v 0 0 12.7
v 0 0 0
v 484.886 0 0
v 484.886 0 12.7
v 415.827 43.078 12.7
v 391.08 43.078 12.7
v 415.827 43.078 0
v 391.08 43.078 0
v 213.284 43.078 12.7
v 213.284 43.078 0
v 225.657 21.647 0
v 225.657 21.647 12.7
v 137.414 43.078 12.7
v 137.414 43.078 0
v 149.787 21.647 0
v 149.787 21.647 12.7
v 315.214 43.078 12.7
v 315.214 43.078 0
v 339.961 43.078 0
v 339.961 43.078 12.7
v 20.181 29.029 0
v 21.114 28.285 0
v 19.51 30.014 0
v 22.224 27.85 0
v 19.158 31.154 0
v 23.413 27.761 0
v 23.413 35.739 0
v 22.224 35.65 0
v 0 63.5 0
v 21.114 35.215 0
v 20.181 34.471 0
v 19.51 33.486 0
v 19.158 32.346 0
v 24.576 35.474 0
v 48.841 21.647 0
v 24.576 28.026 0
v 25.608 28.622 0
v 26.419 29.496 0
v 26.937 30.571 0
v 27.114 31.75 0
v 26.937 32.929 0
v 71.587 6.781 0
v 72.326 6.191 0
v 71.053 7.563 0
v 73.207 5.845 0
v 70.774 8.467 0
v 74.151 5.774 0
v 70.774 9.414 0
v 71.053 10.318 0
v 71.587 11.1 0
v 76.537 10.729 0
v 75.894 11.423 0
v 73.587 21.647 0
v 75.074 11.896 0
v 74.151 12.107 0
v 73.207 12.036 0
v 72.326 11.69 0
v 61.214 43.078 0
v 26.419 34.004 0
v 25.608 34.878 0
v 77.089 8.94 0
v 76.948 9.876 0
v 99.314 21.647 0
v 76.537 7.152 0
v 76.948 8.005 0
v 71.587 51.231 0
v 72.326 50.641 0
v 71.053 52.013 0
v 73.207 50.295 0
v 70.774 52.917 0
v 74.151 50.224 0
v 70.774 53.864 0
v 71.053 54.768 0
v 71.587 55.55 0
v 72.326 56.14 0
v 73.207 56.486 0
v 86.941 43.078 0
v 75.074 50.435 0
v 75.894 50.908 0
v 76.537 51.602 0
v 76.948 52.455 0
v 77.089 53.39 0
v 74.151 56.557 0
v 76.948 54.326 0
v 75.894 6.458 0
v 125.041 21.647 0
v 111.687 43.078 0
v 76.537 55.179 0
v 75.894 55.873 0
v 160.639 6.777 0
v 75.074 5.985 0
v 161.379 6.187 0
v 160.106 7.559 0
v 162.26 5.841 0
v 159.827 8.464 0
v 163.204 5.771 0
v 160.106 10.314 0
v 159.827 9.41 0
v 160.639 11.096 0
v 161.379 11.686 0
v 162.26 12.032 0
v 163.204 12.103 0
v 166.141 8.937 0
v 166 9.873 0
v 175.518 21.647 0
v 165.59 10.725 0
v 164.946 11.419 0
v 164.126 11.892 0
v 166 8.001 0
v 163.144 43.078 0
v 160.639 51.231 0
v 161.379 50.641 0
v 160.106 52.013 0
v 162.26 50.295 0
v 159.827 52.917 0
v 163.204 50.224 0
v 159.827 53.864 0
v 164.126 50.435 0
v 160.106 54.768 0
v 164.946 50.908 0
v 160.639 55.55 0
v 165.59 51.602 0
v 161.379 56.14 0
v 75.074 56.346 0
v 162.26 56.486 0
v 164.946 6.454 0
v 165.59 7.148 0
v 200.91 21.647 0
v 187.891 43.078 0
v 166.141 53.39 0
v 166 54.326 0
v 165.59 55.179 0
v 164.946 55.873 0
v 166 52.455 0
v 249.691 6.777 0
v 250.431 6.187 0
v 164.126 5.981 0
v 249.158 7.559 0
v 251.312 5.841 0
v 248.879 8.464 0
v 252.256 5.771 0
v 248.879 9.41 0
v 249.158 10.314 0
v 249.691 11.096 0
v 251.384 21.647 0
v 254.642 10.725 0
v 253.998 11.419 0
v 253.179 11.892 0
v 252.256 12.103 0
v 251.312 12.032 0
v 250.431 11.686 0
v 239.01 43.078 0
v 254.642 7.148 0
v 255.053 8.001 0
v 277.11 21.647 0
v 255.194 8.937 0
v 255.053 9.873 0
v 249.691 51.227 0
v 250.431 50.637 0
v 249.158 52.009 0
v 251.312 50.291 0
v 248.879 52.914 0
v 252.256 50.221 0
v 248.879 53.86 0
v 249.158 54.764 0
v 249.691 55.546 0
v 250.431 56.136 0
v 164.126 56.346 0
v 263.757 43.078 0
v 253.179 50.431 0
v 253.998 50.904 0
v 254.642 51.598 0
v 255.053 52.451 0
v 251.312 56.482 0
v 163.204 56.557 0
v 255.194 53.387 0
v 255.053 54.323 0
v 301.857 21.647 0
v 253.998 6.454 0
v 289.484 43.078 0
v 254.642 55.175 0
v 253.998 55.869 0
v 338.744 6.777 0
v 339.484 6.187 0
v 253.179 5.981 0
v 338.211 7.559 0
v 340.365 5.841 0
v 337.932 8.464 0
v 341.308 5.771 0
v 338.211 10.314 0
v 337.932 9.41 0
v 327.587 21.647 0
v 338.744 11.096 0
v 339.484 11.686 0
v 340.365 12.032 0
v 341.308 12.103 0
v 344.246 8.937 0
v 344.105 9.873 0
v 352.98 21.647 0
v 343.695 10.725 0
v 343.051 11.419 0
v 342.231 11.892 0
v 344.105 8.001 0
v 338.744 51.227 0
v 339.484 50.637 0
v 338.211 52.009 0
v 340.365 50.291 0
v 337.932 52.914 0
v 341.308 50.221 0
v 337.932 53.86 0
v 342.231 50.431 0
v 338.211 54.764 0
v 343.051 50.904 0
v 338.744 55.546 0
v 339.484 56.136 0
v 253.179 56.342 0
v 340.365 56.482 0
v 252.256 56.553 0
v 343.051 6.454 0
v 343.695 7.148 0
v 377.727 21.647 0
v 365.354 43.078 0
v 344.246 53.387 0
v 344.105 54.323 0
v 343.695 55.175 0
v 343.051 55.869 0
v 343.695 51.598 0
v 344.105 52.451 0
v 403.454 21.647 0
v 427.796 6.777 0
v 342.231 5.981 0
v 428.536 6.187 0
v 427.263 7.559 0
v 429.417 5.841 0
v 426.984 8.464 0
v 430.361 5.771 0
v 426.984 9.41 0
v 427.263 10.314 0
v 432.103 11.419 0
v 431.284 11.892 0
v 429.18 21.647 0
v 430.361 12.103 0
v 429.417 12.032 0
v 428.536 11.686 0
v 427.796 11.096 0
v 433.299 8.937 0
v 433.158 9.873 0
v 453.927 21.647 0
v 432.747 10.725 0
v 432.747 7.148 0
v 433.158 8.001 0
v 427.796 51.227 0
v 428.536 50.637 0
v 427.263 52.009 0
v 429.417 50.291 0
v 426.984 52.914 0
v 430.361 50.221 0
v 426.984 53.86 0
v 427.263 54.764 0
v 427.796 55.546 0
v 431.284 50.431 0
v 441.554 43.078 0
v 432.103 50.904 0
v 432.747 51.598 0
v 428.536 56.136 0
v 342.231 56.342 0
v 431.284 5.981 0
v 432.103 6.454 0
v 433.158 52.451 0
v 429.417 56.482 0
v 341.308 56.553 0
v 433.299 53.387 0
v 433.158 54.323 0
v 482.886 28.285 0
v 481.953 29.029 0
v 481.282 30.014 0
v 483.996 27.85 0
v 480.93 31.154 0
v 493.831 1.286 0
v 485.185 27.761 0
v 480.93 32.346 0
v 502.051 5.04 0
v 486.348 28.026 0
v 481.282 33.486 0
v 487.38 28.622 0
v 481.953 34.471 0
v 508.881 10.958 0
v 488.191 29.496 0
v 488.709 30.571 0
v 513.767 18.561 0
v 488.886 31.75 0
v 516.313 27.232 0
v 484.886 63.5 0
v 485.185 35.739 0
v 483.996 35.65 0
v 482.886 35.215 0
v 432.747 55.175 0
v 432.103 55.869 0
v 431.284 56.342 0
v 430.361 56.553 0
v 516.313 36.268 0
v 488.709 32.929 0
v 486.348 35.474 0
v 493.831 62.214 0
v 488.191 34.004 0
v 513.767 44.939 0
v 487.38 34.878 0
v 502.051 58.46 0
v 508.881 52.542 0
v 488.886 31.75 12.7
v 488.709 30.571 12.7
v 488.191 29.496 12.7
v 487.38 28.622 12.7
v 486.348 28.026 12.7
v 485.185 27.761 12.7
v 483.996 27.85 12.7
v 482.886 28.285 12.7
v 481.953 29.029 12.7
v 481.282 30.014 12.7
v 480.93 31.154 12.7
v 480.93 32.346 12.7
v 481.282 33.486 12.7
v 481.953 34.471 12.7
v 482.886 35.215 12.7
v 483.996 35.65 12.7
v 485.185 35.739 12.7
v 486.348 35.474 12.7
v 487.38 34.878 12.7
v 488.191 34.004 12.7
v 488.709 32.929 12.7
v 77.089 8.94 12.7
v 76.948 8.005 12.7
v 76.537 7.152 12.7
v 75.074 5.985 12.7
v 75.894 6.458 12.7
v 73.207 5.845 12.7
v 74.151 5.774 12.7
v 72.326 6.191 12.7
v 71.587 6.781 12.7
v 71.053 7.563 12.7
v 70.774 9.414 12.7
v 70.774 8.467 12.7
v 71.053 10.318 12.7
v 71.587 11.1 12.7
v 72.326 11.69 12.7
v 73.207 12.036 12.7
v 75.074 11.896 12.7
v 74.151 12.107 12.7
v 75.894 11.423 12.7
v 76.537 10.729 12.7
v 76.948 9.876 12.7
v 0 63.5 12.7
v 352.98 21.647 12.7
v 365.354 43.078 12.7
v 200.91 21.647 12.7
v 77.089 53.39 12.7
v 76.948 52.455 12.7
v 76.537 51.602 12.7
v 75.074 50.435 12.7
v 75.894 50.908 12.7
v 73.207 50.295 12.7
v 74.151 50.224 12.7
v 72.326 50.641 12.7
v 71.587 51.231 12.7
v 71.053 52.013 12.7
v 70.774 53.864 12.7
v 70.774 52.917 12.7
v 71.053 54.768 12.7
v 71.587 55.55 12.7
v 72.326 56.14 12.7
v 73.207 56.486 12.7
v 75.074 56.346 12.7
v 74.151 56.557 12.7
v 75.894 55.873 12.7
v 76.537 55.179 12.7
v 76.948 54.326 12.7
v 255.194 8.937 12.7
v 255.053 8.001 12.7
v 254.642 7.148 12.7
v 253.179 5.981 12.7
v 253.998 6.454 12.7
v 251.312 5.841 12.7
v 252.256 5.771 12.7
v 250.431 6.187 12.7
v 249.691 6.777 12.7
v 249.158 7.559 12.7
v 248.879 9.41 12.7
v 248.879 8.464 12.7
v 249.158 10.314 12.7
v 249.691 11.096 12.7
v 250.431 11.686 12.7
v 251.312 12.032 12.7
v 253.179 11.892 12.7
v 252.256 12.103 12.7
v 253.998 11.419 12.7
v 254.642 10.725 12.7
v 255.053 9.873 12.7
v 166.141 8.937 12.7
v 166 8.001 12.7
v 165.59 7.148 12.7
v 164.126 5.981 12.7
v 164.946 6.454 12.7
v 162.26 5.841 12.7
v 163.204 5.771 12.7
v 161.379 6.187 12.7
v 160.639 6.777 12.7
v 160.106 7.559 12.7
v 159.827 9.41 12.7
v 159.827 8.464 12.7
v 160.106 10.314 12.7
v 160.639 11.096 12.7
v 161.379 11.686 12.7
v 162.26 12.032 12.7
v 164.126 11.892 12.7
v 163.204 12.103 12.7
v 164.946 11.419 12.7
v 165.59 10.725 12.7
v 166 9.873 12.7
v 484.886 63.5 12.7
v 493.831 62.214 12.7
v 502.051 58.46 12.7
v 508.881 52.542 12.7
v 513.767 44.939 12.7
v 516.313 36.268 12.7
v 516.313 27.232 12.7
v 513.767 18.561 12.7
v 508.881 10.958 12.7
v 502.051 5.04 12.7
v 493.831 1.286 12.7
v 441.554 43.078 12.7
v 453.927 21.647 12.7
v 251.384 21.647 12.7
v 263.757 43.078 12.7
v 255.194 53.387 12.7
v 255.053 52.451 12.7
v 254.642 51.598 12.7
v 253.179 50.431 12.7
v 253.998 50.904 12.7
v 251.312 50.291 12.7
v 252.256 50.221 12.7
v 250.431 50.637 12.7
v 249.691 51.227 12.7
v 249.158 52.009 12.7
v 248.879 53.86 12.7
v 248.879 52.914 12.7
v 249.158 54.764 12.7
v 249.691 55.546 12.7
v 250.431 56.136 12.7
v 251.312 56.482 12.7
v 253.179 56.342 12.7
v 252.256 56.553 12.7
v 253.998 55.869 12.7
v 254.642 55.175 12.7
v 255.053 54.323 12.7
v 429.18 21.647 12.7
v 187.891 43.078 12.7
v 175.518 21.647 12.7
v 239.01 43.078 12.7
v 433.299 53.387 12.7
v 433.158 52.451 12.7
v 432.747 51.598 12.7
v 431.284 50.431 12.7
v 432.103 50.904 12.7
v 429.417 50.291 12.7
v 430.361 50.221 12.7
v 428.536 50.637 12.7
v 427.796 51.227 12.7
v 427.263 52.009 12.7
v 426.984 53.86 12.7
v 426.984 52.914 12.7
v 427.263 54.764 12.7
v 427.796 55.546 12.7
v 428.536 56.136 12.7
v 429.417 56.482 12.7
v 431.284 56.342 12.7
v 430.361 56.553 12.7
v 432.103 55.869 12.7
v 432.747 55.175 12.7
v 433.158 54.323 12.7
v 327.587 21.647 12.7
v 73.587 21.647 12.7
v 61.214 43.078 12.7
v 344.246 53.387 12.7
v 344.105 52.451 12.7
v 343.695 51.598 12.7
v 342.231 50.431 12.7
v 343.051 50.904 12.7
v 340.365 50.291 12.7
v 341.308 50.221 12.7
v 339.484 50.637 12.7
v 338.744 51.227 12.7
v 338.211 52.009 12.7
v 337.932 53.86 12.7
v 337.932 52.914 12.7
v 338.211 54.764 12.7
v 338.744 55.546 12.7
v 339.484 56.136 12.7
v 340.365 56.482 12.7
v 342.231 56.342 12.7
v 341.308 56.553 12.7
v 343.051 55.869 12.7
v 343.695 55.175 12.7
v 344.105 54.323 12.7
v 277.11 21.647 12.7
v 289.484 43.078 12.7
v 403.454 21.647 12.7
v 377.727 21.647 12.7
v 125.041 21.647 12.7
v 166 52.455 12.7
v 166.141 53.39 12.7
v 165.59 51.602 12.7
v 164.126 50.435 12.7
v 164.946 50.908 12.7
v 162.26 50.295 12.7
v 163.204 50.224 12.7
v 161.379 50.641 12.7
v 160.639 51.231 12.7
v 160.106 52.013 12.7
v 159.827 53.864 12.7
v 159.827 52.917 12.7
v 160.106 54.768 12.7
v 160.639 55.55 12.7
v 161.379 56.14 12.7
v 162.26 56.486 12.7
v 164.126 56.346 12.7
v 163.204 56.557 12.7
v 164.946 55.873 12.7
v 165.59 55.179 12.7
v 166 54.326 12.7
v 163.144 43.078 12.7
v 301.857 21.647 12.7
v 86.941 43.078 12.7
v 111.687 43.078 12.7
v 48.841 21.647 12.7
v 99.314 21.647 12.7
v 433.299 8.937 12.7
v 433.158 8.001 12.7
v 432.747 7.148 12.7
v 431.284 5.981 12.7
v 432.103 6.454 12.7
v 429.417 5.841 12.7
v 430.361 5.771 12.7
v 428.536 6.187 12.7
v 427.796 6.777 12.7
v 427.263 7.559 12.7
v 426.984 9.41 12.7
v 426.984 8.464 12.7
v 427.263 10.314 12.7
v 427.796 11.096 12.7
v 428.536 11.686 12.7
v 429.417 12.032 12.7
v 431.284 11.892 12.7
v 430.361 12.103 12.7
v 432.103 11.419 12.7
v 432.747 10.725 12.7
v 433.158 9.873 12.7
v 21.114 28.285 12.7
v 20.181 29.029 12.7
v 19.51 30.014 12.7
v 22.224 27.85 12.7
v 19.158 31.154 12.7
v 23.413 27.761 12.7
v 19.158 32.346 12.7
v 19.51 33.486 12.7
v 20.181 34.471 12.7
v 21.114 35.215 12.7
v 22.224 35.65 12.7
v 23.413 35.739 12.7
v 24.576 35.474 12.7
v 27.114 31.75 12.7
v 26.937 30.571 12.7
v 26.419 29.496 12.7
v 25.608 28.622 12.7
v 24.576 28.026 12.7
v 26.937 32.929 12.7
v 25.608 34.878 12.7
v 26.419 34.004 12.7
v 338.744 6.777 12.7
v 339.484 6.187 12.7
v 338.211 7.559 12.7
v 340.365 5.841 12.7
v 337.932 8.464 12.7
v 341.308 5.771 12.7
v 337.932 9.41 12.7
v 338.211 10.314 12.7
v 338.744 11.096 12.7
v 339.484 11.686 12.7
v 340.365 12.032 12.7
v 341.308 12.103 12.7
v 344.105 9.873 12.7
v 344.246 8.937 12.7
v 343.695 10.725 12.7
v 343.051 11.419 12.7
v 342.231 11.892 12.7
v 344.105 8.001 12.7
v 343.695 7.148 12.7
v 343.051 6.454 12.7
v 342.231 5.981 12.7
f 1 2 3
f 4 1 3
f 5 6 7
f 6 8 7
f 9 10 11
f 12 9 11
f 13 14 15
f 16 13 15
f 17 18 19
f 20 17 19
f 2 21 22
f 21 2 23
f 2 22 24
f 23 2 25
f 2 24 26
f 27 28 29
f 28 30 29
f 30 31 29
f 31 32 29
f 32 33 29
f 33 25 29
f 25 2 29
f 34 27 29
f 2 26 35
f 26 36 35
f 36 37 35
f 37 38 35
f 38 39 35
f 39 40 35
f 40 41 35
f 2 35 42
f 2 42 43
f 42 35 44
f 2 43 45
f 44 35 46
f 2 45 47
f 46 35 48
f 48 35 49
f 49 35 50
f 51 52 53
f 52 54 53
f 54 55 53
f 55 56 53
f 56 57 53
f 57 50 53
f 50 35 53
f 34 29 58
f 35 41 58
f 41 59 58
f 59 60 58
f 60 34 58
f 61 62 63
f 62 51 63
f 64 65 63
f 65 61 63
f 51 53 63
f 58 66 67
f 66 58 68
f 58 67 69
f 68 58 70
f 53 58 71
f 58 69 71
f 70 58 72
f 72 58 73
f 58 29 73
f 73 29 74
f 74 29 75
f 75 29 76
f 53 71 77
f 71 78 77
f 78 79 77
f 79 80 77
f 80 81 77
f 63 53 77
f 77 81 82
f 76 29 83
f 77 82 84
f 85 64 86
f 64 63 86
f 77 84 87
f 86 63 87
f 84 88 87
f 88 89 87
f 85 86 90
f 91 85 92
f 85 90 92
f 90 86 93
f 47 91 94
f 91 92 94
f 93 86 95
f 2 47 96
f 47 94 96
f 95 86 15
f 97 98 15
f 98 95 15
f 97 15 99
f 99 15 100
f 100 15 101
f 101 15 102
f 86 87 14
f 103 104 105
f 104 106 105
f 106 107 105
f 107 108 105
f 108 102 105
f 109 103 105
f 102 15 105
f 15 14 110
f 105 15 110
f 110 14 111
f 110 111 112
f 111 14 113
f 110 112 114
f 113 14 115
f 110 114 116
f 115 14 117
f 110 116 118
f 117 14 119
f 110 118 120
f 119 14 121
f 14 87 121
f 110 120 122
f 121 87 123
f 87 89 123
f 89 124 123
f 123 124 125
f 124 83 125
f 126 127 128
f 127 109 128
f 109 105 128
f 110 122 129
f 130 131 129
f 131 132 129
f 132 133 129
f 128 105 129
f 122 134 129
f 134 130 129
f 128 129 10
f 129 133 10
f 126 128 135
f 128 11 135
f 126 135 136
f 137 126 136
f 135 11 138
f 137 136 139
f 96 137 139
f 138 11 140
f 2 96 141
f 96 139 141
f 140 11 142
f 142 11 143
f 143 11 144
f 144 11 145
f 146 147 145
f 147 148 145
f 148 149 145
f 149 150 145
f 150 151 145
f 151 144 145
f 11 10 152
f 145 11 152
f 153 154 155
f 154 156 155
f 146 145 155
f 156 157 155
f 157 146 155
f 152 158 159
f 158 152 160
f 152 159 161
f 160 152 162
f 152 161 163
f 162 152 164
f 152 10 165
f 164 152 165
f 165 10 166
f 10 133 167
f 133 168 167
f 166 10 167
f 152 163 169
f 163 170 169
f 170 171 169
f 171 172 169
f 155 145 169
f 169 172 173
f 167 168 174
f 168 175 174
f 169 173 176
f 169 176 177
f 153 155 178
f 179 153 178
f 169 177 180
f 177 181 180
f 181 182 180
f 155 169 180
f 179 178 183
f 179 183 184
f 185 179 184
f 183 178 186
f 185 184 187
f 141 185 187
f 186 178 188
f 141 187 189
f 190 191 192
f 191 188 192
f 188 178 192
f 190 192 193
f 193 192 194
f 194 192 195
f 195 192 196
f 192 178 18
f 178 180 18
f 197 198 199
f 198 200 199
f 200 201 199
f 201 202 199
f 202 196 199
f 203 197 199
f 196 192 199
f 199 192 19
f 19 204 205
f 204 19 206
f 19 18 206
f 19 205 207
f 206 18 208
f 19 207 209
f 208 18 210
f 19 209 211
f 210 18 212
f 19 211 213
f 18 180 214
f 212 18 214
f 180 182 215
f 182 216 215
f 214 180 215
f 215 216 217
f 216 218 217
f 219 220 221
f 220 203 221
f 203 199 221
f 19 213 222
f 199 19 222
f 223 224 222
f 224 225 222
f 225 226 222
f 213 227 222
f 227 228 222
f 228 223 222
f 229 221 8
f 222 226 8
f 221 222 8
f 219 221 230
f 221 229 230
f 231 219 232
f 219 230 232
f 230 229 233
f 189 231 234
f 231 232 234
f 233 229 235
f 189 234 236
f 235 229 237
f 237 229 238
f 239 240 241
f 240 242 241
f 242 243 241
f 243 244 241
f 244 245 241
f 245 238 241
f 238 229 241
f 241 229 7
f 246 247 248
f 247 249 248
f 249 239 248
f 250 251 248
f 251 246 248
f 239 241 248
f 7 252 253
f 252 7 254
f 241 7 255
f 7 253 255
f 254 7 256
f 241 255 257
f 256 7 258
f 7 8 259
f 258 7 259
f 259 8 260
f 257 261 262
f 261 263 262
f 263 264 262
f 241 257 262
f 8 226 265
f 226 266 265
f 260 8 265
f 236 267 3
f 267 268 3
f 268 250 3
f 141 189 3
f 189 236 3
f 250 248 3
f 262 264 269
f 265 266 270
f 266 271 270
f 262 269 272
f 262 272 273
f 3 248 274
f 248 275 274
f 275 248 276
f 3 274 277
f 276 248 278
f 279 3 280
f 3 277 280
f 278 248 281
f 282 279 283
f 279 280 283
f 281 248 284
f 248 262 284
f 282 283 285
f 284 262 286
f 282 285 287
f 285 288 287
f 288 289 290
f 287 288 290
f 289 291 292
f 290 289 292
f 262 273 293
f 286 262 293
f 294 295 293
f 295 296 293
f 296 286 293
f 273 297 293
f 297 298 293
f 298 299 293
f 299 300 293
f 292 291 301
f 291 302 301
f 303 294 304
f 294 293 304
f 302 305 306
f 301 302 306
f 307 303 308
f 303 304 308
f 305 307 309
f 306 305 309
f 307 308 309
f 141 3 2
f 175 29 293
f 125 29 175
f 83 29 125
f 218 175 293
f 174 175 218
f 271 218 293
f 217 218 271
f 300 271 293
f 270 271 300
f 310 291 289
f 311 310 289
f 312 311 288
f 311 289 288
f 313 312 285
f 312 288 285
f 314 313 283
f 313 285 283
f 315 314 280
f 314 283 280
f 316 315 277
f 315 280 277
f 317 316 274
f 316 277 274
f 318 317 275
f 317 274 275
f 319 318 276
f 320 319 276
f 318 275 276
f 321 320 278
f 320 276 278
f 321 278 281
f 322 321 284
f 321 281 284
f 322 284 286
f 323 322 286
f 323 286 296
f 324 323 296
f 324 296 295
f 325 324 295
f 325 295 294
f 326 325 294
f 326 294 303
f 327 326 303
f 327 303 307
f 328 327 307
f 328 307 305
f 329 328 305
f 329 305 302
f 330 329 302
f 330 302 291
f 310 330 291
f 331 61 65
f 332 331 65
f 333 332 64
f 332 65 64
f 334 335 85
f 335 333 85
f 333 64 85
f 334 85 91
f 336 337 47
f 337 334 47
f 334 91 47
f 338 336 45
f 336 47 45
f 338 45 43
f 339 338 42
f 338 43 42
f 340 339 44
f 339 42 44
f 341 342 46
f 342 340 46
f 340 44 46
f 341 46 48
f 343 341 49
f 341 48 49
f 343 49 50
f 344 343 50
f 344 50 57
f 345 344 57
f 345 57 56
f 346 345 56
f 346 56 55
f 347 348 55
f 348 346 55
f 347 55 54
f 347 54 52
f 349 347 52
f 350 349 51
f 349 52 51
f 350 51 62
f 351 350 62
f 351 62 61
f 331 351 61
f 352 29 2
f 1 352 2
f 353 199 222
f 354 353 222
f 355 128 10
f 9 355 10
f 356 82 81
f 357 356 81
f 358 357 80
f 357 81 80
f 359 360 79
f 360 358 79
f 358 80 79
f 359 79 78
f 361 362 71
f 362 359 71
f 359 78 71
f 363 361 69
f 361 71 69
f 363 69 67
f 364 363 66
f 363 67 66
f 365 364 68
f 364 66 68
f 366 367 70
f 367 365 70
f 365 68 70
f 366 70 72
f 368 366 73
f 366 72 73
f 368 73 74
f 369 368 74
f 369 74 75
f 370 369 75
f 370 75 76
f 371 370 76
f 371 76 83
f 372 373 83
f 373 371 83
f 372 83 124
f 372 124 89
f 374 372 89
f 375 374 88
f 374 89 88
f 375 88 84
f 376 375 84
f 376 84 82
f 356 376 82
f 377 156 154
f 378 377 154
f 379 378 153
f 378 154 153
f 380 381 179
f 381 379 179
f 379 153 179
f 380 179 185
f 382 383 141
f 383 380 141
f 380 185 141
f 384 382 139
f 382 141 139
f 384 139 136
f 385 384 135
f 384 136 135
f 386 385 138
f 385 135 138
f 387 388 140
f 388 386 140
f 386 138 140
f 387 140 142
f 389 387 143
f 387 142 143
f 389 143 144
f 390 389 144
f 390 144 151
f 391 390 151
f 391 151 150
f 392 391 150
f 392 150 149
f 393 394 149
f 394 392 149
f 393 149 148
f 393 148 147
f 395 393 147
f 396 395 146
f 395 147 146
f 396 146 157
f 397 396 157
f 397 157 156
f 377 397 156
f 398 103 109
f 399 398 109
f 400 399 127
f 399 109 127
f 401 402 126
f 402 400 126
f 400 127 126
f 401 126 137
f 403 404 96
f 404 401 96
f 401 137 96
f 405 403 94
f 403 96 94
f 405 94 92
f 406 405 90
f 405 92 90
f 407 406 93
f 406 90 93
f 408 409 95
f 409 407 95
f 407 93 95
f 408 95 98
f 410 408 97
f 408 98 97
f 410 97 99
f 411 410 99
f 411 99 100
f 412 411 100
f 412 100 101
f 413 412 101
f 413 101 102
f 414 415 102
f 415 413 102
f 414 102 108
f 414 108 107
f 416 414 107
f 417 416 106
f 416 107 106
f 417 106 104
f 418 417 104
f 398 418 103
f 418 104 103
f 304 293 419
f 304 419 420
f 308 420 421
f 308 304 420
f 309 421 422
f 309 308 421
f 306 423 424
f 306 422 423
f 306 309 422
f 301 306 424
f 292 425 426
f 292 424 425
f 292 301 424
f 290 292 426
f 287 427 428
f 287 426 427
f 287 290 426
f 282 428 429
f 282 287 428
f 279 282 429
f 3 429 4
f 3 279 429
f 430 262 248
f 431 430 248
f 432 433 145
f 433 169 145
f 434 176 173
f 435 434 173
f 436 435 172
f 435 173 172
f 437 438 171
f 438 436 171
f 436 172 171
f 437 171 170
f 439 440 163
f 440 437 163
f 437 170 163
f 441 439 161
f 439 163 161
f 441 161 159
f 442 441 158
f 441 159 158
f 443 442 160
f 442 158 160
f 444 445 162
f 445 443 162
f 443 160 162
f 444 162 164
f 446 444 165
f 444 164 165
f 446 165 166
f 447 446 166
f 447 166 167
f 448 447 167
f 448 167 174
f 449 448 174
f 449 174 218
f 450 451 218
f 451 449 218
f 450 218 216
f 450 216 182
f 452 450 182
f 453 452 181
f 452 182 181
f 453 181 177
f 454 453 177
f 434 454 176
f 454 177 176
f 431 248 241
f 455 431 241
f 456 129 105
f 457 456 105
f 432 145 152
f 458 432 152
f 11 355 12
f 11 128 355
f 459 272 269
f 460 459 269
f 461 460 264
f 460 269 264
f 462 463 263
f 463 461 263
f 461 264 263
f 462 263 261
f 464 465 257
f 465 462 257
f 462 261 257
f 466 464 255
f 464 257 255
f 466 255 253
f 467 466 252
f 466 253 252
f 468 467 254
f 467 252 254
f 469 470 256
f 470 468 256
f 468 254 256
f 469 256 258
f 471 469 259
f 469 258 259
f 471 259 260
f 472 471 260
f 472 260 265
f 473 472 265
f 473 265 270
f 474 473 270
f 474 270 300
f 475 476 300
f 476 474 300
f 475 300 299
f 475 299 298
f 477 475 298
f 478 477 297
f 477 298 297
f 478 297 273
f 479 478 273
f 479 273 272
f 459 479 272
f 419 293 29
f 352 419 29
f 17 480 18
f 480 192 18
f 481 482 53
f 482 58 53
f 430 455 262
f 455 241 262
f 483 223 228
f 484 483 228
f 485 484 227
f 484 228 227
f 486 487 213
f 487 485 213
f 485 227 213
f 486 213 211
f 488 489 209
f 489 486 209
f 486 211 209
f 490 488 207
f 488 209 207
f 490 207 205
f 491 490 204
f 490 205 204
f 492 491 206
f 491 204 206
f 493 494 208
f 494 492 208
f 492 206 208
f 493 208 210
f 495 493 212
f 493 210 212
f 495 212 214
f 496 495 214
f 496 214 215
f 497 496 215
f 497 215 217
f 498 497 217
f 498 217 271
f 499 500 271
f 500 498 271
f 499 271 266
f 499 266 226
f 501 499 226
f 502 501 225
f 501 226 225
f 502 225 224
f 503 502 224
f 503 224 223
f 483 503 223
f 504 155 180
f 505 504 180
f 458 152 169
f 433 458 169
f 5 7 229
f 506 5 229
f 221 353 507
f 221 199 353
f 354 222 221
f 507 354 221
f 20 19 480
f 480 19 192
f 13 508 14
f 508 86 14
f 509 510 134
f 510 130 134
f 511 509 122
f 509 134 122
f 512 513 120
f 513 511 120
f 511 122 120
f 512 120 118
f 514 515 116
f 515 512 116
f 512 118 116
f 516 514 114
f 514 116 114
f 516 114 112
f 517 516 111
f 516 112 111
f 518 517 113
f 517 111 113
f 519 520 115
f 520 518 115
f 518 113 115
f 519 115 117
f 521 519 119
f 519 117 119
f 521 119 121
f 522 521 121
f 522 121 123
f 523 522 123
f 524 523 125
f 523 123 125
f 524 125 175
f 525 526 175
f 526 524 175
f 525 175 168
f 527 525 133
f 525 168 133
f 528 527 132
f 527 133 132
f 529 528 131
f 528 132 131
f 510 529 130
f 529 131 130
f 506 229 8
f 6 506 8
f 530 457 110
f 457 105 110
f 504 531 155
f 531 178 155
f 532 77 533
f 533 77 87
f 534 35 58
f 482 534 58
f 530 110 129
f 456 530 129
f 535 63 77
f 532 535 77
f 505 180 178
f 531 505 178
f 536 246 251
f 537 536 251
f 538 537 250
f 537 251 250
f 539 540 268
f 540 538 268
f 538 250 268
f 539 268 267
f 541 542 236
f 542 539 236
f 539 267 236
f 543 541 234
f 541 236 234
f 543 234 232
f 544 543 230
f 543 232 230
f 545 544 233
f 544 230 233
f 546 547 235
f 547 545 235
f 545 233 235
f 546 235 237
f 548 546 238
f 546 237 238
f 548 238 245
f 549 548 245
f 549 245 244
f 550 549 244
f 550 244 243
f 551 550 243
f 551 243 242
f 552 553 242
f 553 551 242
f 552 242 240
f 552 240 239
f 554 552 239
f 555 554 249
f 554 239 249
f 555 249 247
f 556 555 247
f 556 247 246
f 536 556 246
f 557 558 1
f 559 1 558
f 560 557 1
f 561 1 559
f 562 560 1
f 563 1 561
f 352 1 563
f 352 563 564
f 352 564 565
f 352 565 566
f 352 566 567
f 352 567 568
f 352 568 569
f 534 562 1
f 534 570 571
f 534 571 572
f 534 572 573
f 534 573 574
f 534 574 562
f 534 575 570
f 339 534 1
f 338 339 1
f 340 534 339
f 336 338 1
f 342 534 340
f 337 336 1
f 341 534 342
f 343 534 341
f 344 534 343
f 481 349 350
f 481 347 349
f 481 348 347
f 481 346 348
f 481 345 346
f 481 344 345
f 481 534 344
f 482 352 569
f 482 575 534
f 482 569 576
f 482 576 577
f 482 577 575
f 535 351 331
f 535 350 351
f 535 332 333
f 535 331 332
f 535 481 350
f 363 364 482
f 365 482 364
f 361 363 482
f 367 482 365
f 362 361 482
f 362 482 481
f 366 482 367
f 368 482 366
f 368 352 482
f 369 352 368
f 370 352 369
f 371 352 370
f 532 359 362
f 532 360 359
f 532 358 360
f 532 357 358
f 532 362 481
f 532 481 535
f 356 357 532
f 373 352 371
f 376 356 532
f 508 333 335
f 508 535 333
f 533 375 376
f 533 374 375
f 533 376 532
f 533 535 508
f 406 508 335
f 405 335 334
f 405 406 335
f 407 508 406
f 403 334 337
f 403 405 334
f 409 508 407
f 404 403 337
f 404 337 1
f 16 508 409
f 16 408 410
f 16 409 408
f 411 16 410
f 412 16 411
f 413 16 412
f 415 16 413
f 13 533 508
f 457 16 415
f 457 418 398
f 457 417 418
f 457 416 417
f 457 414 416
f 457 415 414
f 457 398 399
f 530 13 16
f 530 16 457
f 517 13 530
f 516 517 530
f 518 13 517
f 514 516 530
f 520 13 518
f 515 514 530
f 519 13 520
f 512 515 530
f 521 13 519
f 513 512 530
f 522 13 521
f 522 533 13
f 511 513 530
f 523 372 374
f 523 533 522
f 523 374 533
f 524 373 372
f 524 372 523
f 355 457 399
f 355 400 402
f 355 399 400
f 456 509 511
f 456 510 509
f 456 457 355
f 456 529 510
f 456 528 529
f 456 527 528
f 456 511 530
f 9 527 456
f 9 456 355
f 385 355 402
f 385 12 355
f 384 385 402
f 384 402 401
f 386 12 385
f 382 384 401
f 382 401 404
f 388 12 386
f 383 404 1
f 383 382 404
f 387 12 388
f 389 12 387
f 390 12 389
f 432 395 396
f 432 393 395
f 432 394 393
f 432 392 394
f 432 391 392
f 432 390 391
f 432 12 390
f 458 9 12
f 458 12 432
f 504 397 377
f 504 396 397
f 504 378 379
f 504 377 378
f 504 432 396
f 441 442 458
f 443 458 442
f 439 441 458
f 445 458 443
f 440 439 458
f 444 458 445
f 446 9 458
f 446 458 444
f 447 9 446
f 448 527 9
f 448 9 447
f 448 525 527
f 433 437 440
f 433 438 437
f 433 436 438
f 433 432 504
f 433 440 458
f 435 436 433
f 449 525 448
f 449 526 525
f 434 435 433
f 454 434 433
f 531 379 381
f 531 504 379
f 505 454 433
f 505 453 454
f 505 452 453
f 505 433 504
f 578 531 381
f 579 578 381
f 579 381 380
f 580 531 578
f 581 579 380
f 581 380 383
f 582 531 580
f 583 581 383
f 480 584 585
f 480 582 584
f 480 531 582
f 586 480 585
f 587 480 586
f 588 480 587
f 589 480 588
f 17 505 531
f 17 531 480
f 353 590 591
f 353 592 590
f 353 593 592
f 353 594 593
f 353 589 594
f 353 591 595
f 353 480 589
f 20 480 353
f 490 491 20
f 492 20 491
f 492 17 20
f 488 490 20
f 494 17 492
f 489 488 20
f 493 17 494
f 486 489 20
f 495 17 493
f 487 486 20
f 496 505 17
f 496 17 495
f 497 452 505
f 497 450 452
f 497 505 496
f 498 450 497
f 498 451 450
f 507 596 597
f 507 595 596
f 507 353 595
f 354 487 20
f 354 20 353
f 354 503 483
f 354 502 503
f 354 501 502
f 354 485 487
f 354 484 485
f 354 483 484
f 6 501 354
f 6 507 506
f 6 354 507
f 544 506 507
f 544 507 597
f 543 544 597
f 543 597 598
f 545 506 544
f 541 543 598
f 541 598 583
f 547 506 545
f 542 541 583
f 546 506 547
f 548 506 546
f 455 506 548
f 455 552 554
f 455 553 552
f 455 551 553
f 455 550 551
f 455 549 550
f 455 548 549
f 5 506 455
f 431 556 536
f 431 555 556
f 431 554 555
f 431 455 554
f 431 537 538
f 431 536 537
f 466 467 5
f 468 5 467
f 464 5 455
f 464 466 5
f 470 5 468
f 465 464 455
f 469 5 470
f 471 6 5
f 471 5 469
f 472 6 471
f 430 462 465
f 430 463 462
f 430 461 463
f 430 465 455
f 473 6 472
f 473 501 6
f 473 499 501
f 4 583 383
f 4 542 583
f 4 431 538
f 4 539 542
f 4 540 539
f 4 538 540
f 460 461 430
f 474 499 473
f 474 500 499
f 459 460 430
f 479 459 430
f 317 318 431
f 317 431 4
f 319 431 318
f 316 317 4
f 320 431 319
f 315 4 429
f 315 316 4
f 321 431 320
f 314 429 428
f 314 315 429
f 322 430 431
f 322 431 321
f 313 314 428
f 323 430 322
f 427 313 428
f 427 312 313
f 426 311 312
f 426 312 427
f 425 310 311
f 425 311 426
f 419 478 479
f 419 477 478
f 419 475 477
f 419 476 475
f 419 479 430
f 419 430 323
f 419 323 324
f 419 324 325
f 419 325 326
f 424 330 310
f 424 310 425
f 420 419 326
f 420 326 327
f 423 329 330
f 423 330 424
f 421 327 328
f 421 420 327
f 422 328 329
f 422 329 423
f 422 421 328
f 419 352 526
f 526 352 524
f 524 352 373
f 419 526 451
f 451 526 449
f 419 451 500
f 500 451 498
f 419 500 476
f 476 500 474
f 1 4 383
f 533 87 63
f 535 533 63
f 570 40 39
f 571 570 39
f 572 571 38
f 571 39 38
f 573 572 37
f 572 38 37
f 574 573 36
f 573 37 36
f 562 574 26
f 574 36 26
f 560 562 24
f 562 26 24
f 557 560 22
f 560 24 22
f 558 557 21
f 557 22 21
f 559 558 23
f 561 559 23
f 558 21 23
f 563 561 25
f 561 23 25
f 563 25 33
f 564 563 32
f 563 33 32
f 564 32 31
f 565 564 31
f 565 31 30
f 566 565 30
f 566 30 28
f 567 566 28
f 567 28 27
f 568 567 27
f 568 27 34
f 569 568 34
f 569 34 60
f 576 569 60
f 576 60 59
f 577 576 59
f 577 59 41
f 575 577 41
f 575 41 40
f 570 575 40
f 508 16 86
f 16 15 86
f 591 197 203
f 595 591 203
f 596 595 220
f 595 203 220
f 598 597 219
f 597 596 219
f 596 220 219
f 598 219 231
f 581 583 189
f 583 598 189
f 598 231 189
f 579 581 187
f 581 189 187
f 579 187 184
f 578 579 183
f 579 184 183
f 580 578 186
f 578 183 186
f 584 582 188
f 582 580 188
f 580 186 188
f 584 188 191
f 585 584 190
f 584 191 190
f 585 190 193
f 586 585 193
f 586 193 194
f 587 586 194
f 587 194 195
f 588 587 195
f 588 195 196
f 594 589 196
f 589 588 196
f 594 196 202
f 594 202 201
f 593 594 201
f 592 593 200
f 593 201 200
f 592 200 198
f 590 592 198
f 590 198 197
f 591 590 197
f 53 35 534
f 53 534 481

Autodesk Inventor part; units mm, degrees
ref_plane "YZ Plane" through (0, 0, 0) normal (1, 0, 0) x (0, 1, 0)
ref_plane "XZ Plane" through (0, 0, 0) normal (0, 1, 0) x (-1, 0, 0)
ref_plane "XY Plane" through (0, 0, 0) normal (0, 0, 1) x (1, 0, 0)
sketch "Sketch1" plane through (0, 0, 0) normal (0, 0, 1) x (1, 0, 0)
  line L0 (0, 0) -> (484.886, 0)
  line L1 (484.886, 63.5) -> (0, 63.5)
  line L2 (0, 63.5) -> (0, 0)
  circle A0 centre (73.914, 53.3905) radius 3.175
  circle A1 centre (162.9664, 53.3905) radius 3.175
  circle A2 centre (252.0188, 53.3868) radius 3.175
  circle A3 centre (341.0712, 53.3868) radius 3.175
  circle A4 centre (430.1236, 53.3868) radius 3.175
  circle A5 centre (73.914, 8.9405) radius 3.175
  circle A6 centre (162.9664, 8.9368) radius 3.175
  circle A7 centre (252.0188, 8.9368) radius 3.175
  circle A8 centre (341.0712, 8.9368) radius 3.175
  circle A9 centre (430.1236, 8.9368) radius 3.175
  line L3 (61.214, 43.0781) -> (73.5873, 21.6469)
  line L4 (48.8407, 21.6469) -> (61.214, 43.0781)
  line L5 (137.414, 43.0781) -> (149.7873, 21.6469)
  line L6 (149.7873, 21.6469) -> (125.0407, 21.6469)
  line L7 (125.0407, 21.6469) -> (137.414, 43.0781)
  line L8 (99.314, 21.6469) -> (86.9407, 43.0781)
  line L9 (86.9407, 43.0781) -> (111.6873, 43.0781)
  line L10 (111.6873, 43.0781) -> (99.314, 21.6469)
  line L11 (48.8407, 21.6469) -> (73.5873, 21.6469)
  line L12 (289.4838, 43.0781) -> (301.8571, 21.6469)
  line L13 (301.8571, 21.6469) -> (277.1105, 21.6469)
  line L14 (277.1105, 21.6469) -> (289.4838, 43.0781)
  line L15 (263.7571, 43.0781) -> (251.3838, 21.6469)
  line L16 (251.3838, 21.6469) -> (239.0105, 43.0781)
  line L17 (239.0105, 43.0781) -> (263.7571, 43.0781)
  line L18 (213.2838, 43.0781) -> (225.6571, 21.6469)
  line L19 (200.9105, 21.6469) -> (225.6571, 21.6469)
  line L20 (200.9105, 21.6469) -> (213.2838, 43.0781)
  line L21 (441.5536, 43.0781) -> (453.9269, 21.6469)
  line L22 (453.9269, 21.6469) -> (429.1803, 21.6469)
  line L23 (429.1803, 21.6469) -> (441.5536, 43.0781)
  line L24 (415.8269, 43.0781) -> (403.4536, 21.6469)
  line L25 (403.4536, 21.6469) -> (391.0803, 43.0781)
  line L26 (391.0803, 43.0781) -> (415.8269, 43.0781)
  line L27 (365.3536, 43.0781) -> (377.7269, 21.6469)
  line L28 (352.9803, 21.6469) -> (377.7269, 21.6469)
  line L29 (352.9803, 21.6469) -> (365.3536, 43.0781)
  line L30 (175.5175, 21.6469) -> (163.1442, 43.0781)
  line L31 (163.1442, 43.0781) -> (187.8909, 43.0781)
  line L32 (187.8909, 43.0781) -> (175.5175, 21.6469)
  line L33 (339.9607, 43.0781) -> (327.5873, 21.6469)
  line L34 (327.5873, 21.6469) -> (315.214, 43.0781)
  line L35 (315.214, 43.0781) -> (339.9607, 43.0781)
  line L36 (15.7817, 31.75) -> (30.4463, 31.75)
  circle A10 centre (23.114, 31.75) radius 4.0005
  circle A11 centre (484.886, 31.75) radius 4.0005
  arc A12 (484.886, 0) -> (484.886, 63.5) centre (484.886, 31.75) ccw
  point P0 (135.1884, 47.8306)
  point P1 (135.1884, 33.5431)
  point P2 (23.114, 19.05)
  point P3 (23.114, 25.4)
  point P4 (287.2582, 33.5431)
  point P5 (439.328, 33.5431)
  dimension "d18" = 44.45
  dimension "d36" = 56.5658
  dimension "d69" = 126.3396
  dimension "d72" = 25.4
  dimension "d12" = 6.35
  dimension "d15" = 89.0524
  dimension "d44" = 6.35
  dimension "d66" = 100.9467
  dimension "d97" = 152.0698
  dimension "d102" = 51.1231
  dimension "d115" = 8.001
extrude "Extrusion1" add sketch "Sketch1" along normal blind 12.7 contours L2 L1 A12 L0 | L3 L11 L4 | L12 L13 L14 | L15 L16 L17 | L18 L19 L20 | L21 L22 L23 | L24 L25 L26 | L27 L28 L29 | L30 L31 L32 | L33 L34 L35 | A10 L36 | L36 A10 | A11
extrude "Extrusion4" cut sketch "Sketch1" along normal blind 12.7 contours L3 L11 L4
extrude "Extrusion5" cut sketch "Sketch1" along normal blind 12.7 contours L12 L13 L14 | L15 L16 L17 | L18 L19 L20 | L21 L22 L23 | L24 L25 L26 | L27 L28 L29 | L30 L31 L32 | L33 L34 L35
extrude "Extrusion6" cut sketch "Sketch1" along normal blind 25.4 contours A11
extrude "Extrusion7" cut sketch "Sketch1" along normal blind 25.4 contours A10 L36 | L36 A10
properties part number "arm_plate_evan"
